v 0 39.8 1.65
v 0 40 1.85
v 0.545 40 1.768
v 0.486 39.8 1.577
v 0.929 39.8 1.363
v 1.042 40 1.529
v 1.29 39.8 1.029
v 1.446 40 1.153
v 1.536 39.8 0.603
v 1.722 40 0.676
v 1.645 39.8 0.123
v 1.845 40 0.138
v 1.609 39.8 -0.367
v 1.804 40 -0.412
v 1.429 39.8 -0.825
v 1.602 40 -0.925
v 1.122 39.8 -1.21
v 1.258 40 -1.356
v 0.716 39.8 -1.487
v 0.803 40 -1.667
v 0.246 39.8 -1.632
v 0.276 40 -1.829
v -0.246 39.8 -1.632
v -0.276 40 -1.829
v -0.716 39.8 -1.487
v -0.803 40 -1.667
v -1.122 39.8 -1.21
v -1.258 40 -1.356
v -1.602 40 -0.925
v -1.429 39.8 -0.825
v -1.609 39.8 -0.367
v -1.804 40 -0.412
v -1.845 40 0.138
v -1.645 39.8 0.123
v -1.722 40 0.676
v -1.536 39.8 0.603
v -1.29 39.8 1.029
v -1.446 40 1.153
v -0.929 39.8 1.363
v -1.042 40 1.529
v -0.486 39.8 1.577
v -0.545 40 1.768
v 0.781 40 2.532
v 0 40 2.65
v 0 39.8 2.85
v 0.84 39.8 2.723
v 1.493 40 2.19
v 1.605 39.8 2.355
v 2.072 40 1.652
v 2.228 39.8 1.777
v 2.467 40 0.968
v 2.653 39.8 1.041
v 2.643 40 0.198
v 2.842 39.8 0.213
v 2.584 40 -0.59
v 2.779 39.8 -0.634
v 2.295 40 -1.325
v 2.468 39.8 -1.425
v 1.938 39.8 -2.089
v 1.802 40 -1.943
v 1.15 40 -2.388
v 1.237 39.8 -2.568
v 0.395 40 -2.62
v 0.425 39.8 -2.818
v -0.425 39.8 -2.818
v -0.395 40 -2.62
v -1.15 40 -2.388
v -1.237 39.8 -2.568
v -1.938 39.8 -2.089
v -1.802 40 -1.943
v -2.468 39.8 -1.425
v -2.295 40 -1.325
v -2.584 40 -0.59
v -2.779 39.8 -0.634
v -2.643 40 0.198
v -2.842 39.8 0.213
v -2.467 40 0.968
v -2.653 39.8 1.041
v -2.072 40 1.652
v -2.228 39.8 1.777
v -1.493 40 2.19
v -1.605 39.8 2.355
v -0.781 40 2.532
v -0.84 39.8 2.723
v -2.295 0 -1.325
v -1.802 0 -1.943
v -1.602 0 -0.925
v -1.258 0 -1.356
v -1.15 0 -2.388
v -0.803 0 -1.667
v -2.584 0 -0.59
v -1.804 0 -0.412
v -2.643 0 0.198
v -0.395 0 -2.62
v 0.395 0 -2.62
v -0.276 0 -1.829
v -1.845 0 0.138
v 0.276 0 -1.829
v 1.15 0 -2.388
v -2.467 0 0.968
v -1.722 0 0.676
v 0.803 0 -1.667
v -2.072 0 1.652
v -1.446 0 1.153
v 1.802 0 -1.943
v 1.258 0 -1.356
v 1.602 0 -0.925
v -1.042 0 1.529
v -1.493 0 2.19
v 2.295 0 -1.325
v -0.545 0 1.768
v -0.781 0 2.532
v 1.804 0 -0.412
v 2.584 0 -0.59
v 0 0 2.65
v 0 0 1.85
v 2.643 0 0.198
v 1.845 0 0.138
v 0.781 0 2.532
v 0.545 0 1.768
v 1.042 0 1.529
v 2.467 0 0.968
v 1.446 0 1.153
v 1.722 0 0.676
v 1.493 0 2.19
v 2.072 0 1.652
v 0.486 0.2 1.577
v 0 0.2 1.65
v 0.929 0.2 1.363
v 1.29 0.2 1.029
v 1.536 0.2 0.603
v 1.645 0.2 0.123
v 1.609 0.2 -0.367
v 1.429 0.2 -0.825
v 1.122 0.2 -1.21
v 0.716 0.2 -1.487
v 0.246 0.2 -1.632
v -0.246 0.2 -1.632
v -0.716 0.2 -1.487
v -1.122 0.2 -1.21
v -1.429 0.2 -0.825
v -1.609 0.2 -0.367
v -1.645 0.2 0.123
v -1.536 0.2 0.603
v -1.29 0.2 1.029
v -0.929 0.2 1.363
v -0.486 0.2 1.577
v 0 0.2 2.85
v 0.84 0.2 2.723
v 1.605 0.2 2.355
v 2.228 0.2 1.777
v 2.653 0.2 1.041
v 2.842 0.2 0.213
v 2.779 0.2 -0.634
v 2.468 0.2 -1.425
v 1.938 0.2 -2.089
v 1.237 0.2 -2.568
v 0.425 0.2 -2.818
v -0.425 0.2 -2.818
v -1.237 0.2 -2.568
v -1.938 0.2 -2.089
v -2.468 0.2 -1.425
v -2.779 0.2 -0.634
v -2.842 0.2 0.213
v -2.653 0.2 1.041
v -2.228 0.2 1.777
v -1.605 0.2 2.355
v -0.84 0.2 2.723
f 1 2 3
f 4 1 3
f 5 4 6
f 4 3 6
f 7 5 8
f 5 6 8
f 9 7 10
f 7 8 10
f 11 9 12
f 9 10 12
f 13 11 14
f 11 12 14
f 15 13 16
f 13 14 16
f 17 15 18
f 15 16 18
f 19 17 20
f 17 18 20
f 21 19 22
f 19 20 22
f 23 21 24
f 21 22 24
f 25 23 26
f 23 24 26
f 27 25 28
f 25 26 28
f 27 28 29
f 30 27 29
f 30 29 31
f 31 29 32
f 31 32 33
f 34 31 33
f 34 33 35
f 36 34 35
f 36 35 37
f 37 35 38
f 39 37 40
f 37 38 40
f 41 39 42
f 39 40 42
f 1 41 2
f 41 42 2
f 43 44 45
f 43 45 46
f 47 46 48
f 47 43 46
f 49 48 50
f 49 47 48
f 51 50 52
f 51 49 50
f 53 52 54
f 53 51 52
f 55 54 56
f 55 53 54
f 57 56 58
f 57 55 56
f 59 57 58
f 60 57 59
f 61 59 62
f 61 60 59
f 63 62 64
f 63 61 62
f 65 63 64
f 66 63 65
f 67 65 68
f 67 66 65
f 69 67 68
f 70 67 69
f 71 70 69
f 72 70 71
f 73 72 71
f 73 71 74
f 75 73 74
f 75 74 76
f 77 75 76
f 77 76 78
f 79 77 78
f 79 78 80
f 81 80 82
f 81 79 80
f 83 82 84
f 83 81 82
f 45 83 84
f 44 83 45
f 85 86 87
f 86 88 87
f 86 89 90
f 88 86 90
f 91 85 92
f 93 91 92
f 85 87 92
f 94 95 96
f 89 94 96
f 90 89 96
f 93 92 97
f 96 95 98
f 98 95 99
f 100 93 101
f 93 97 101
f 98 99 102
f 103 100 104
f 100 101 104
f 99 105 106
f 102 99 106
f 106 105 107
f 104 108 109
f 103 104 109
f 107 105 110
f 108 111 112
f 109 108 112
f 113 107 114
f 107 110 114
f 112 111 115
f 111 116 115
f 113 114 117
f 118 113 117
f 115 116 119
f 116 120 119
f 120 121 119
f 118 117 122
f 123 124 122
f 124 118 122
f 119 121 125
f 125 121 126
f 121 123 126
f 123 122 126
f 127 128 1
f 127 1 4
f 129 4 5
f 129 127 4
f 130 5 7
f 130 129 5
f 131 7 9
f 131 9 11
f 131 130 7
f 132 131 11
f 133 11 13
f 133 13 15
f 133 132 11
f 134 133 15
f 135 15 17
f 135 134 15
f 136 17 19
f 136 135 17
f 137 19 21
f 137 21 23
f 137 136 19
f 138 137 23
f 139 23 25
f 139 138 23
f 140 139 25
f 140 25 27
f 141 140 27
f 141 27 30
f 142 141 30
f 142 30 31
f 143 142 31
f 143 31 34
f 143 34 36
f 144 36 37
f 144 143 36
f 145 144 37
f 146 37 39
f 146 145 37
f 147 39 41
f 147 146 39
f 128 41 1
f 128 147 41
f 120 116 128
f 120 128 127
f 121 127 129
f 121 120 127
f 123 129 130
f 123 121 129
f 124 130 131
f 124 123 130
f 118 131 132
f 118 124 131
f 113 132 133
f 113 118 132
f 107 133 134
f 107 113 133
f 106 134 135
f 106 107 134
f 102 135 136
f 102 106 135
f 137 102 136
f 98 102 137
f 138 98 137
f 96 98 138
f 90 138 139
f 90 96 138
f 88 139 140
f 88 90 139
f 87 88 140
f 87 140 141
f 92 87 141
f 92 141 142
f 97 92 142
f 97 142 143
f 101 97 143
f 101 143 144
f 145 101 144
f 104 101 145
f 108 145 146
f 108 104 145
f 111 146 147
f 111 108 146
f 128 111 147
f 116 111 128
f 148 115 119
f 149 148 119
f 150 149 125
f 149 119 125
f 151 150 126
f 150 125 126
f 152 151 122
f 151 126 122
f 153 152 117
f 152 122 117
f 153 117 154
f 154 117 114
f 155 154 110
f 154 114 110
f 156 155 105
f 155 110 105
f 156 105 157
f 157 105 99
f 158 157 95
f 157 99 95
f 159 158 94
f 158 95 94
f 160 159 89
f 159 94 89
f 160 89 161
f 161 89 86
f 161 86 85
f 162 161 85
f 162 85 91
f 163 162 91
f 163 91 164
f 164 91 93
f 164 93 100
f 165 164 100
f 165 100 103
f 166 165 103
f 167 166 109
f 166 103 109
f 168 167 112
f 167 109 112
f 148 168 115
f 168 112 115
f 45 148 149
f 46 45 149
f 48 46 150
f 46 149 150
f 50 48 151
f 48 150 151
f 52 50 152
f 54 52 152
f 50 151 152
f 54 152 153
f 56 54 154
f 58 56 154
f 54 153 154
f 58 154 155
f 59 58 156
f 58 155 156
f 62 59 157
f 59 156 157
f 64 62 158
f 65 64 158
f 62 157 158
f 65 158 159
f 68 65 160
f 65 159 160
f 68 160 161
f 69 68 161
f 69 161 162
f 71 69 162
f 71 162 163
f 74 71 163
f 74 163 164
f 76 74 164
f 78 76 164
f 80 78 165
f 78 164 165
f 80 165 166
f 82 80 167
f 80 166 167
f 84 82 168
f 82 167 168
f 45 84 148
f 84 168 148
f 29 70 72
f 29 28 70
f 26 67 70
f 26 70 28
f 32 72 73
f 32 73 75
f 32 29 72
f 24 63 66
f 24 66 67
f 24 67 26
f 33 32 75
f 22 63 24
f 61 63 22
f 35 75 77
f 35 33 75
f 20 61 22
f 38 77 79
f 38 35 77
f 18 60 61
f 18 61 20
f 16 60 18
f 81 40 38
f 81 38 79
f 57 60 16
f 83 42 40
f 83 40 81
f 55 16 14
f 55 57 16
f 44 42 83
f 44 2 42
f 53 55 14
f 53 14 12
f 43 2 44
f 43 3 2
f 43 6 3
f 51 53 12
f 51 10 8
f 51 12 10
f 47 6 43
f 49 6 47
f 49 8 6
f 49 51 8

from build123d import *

# Parameters (mm, degrees)
IZIM1_R                     = 2.85
IZIM1_R_2                   = 1.65
Y_KSEKLIK_EKSTR_ZYON1_DEPTH = 40
PAH1_SIZE                   = 0.2


with BuildPart() as part:
    # Çizim1 → Yükseklik-Ekstrüzyon1 (new body)
    with BuildSketch(Plane(origin=(0, 0, 0), x_dir=(1, 0, 0), z_dir=(0, 1, 0))):
        with Locations(Location((0, 0, 0), (0, 0, 270))):
            Circle(IZIM1_R)
        with Locations(Location((0, 0, 0), (0, 0, 270))):
            Circle(IZIM1_R_2, mode=Mode.SUBTRACT)
    extrude(amount=Y_KSEKLIK_EKSTR_ZYON1_DEPTH)

    # Pah1
    pah1_edges = [part.edges().sort_by_distance(p)[0] for p in [
        (0, 0, -2.85),
        (0, 40, -2.85),
        (0, 0, -1.65),
        (0, 40, -1.65),
    ]]
    chamfer(pah1_edges, length=PAH1_SIZE)


solid = part.part
